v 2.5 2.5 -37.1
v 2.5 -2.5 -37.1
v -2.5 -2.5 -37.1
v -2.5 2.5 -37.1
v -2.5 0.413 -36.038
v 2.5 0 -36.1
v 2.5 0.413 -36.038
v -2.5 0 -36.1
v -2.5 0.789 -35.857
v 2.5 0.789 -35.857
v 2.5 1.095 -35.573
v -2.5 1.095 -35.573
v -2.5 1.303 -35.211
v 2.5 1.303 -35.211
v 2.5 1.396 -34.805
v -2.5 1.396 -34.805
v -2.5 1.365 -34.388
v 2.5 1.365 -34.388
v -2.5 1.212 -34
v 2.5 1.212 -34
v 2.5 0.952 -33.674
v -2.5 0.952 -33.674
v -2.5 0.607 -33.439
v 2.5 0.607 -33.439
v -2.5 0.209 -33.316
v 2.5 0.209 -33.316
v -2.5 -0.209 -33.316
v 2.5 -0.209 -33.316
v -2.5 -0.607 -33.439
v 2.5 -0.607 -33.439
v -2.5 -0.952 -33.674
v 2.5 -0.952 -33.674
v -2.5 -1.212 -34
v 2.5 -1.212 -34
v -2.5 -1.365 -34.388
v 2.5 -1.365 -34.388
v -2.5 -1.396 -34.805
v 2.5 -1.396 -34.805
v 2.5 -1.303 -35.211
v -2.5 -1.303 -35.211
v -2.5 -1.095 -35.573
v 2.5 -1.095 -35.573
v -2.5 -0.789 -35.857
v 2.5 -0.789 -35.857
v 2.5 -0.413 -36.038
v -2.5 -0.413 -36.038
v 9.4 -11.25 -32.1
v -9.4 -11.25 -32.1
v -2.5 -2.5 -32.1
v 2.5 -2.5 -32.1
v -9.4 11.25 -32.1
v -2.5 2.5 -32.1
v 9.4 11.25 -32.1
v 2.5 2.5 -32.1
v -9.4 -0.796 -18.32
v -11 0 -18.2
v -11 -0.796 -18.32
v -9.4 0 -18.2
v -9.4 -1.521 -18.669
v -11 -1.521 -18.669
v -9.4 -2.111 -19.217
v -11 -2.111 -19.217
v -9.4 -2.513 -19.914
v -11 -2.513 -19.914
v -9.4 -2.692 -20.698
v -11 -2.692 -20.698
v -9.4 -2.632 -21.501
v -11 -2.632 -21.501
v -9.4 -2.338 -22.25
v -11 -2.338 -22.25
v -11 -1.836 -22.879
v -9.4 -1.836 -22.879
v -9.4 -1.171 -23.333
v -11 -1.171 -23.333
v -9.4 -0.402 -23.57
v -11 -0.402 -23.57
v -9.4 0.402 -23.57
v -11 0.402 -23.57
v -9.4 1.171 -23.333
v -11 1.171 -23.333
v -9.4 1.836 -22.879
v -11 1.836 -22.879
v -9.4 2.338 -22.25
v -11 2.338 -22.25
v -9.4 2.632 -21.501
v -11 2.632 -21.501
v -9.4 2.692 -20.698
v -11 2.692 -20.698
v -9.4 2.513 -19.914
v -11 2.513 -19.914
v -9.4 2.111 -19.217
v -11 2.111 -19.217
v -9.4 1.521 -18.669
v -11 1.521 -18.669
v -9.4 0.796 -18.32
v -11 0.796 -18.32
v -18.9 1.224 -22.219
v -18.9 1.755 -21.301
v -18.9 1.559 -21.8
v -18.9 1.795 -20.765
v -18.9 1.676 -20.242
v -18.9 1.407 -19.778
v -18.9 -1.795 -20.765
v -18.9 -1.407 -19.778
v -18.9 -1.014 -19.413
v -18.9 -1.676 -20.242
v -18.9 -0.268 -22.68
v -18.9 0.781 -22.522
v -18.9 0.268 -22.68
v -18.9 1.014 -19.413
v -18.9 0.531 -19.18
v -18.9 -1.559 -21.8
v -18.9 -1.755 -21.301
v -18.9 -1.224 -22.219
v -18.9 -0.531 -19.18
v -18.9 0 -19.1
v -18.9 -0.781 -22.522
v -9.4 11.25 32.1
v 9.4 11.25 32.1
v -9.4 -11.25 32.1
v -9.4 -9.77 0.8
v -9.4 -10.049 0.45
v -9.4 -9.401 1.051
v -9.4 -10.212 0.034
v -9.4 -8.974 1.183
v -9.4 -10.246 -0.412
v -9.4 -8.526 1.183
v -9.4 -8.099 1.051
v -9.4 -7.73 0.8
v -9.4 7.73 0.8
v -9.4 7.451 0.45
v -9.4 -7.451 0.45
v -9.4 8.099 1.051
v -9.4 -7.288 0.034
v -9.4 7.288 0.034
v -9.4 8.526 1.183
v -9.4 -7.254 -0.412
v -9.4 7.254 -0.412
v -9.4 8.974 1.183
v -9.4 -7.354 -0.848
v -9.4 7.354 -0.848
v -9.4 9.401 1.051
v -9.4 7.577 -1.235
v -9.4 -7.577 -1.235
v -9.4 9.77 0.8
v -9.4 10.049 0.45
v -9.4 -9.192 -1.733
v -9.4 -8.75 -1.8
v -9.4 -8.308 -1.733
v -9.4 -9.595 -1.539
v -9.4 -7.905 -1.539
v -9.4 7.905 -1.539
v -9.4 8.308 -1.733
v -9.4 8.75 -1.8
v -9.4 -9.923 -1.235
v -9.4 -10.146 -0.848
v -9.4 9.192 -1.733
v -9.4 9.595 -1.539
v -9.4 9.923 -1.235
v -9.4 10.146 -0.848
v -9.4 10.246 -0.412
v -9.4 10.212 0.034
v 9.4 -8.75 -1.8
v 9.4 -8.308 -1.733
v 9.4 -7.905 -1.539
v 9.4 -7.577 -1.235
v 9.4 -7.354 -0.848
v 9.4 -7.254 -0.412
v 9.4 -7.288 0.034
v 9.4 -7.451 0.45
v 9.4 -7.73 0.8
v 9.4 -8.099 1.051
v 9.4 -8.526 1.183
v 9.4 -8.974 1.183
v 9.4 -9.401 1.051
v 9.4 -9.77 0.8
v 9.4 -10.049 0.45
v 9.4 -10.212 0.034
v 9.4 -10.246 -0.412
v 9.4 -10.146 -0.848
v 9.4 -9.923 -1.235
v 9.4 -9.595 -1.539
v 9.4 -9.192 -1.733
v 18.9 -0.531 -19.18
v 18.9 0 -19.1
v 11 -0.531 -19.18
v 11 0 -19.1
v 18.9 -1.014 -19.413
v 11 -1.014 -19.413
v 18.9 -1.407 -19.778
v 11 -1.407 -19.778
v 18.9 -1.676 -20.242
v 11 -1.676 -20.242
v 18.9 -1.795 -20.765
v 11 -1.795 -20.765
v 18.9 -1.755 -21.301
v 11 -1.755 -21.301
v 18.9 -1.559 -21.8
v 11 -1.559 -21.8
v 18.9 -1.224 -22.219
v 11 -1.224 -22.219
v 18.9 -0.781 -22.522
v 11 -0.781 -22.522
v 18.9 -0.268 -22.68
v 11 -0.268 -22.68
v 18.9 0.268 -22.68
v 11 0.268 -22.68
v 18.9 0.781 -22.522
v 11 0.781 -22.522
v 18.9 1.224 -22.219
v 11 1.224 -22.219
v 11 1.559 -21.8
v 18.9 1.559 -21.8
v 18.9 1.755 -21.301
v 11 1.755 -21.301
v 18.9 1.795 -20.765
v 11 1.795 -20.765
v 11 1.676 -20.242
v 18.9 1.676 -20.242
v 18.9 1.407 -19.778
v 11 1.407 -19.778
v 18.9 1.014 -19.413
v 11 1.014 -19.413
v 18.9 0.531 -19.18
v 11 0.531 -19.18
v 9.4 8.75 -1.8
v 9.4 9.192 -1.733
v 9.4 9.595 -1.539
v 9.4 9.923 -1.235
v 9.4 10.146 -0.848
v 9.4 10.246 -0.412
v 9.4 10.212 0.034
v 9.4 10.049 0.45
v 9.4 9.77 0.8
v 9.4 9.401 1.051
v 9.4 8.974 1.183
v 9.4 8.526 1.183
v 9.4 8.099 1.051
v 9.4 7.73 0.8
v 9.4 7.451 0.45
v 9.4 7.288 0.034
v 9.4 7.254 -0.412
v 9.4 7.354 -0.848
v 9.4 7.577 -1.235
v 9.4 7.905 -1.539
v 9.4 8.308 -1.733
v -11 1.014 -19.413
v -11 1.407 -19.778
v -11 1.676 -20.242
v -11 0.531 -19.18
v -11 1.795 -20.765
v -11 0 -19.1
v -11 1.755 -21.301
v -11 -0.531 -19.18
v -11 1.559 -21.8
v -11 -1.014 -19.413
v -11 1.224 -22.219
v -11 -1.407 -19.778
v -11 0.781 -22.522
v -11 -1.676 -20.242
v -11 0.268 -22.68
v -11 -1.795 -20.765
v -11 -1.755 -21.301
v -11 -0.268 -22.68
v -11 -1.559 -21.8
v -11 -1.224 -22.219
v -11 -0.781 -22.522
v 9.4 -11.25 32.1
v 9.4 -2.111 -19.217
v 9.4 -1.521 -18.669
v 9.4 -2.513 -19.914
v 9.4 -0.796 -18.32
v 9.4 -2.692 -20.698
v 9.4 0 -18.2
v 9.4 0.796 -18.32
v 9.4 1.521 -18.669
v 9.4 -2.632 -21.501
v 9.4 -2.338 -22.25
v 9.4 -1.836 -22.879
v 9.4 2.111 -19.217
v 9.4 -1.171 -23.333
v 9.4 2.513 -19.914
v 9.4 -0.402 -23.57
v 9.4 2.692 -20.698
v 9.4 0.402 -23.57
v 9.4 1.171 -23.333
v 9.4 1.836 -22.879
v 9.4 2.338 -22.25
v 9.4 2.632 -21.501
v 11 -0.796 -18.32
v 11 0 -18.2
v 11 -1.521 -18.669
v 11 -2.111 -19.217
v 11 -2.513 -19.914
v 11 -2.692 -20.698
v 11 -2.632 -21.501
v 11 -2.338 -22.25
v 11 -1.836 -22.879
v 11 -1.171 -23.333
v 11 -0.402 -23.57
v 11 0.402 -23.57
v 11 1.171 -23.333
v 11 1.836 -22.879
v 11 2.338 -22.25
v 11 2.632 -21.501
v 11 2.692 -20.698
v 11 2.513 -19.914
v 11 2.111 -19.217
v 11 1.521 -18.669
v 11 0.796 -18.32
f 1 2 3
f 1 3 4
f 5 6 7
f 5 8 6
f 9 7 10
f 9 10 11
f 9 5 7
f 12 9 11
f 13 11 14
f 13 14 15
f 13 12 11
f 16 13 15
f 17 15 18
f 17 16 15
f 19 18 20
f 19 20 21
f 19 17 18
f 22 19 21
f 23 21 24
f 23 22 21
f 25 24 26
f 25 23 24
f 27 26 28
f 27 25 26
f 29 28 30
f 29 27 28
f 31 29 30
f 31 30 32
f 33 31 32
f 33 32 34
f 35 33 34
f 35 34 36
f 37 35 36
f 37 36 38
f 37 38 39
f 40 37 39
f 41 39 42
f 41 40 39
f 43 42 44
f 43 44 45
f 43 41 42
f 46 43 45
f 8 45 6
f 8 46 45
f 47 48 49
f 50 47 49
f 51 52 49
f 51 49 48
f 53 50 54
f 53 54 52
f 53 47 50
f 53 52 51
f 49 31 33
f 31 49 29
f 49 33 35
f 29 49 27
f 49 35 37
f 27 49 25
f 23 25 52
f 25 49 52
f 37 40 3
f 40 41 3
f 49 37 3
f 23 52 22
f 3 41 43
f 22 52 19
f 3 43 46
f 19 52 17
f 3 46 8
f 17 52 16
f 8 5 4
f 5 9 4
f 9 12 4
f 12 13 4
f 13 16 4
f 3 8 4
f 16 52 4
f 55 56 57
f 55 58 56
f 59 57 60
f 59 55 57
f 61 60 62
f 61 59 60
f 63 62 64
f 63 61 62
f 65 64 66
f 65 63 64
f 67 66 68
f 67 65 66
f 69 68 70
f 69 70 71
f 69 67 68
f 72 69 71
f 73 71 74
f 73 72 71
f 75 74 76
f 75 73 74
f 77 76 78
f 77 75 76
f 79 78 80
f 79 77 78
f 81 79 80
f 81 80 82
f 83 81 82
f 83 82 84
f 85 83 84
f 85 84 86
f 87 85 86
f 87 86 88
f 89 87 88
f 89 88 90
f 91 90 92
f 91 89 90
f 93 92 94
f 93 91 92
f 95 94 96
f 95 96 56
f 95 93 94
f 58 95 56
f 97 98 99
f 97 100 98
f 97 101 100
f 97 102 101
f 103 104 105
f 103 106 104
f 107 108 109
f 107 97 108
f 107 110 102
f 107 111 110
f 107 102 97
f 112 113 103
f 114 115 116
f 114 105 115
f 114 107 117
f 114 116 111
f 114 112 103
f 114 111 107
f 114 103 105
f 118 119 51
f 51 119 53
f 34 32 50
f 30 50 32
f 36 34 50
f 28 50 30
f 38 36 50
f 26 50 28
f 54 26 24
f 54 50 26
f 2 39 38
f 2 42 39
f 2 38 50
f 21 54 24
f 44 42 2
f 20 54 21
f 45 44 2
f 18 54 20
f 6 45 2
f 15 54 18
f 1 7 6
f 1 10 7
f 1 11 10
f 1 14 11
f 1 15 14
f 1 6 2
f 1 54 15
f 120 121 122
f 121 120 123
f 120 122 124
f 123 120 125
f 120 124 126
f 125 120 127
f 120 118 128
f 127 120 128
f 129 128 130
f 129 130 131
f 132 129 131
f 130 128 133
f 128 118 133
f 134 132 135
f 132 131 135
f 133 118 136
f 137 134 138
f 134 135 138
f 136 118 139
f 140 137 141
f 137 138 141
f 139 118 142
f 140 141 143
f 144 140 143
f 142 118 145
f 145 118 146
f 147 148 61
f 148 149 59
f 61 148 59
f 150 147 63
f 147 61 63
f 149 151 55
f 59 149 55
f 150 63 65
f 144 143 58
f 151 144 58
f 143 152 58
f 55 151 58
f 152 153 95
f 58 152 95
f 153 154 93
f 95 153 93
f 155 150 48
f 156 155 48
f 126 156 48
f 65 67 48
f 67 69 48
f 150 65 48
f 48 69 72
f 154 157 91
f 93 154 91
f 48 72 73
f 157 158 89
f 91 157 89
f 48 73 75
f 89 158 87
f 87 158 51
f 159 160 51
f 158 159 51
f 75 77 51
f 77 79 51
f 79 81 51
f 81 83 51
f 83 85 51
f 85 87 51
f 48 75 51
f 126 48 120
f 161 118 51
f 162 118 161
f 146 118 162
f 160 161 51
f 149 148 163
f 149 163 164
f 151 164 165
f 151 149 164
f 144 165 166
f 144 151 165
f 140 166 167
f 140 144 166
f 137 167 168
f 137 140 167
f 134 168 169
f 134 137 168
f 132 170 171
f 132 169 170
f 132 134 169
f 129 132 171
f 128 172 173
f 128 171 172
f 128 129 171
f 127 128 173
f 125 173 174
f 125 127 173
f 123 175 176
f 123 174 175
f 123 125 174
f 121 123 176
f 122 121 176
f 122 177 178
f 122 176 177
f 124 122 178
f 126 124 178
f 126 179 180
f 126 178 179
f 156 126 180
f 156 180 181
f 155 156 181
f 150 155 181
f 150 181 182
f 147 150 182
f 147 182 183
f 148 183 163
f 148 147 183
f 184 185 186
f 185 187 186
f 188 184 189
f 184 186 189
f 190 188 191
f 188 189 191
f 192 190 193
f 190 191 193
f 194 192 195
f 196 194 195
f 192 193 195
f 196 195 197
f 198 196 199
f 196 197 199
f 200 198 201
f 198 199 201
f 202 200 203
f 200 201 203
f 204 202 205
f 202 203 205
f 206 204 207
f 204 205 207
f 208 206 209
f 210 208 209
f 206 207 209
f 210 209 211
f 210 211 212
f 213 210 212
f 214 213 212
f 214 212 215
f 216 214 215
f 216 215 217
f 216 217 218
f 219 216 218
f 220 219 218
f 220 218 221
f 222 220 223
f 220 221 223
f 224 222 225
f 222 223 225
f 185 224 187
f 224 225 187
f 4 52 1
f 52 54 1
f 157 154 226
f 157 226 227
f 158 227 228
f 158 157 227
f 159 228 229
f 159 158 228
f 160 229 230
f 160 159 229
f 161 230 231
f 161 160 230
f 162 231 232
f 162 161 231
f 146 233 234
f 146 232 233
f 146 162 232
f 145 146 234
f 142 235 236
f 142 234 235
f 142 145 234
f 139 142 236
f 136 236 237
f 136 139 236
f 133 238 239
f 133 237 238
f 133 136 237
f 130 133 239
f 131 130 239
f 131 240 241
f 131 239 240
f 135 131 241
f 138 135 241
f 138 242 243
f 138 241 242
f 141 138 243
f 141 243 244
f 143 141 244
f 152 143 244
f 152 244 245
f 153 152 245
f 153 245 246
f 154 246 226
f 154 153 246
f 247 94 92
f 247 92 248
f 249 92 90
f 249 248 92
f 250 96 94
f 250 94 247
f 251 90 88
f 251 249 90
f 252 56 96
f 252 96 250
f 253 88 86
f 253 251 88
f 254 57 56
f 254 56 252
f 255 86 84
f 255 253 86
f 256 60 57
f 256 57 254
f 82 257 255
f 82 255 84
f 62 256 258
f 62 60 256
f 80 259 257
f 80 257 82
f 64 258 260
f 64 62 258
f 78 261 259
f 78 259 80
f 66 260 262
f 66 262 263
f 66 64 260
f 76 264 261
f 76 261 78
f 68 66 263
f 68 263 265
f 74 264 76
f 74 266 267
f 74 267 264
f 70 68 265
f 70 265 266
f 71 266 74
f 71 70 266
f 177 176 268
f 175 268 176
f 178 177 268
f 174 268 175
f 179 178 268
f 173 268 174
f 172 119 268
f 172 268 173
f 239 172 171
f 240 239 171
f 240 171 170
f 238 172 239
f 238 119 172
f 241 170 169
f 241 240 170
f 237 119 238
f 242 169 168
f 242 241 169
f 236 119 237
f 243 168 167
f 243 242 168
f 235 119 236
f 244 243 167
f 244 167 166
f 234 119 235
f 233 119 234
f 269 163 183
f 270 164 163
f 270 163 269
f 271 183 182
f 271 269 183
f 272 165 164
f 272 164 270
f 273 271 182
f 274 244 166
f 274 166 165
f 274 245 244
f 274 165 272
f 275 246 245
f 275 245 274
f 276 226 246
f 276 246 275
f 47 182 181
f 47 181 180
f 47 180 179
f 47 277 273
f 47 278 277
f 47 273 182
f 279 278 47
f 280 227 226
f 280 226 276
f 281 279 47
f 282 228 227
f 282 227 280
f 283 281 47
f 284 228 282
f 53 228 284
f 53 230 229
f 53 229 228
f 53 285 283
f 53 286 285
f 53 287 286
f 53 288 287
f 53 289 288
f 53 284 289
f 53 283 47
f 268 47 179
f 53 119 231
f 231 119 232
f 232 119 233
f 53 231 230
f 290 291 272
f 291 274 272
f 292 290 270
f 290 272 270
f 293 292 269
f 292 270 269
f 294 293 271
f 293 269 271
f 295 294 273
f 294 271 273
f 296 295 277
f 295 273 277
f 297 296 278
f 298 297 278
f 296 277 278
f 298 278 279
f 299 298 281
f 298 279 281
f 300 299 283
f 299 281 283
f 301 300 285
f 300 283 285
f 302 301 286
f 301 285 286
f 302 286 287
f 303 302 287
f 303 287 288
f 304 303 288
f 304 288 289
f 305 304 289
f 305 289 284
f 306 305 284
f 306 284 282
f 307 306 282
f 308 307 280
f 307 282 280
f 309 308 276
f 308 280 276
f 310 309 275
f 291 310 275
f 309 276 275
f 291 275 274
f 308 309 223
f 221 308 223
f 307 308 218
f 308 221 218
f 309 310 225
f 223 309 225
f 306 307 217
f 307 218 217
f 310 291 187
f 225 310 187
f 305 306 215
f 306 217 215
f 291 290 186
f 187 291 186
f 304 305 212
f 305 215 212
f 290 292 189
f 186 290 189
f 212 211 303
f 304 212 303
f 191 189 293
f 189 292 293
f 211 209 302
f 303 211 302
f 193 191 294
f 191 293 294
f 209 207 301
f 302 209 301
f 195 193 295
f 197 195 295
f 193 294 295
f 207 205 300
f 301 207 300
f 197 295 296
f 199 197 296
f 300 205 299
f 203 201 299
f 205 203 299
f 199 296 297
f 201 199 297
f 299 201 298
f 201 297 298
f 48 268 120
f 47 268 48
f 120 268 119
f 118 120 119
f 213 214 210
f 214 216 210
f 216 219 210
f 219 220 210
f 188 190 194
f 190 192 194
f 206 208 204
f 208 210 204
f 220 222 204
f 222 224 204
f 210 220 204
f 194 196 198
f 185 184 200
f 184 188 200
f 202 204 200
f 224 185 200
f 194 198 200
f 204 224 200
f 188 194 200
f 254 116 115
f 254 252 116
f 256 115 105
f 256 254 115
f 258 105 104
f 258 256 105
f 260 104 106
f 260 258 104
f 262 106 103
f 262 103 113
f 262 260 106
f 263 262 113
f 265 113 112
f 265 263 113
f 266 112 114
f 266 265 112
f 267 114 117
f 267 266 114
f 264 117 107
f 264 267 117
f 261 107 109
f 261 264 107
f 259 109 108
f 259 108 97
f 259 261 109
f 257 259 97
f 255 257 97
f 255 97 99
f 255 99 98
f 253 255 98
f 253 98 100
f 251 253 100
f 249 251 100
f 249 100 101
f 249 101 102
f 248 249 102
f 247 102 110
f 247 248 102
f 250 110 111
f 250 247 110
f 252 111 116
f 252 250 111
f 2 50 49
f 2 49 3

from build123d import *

# Parameters (mm, degrees)
SKETCH1_W               = 64.2
SKETCH1_H               = 22.5
BOSS_EXTRUDE1_DEPTH     = 9.4
SKETCH3_W               = 5
SKETCH3_H               = 5
SKETCH3_R               = 1.4
BOSS_EXTRUDE2_DEPTH     = 2.5
CUT_EXTRUDE1_DEPTH      = 44.129833063
CUT_EXTRUDE1_DEPTH_BACK = 44.129833063
SKETCH4_R               = 1.5


with BuildPart() as part:
    # Sketch1 → Boss-Extrude1 (new, symmetric)
    with BuildSketch(Plane(origin=(0, 0, 0), x_dir=(0, 0, -1), z_dir=(1, 0, 0))):
        Rectangle(SKETCH1_W, SKETCH1_H)
    extrude(amount=BOSS_EXTRUDE1_DEPTH, both=True)

    # Sketch2 → Revolve1 (revolve)
    with BuildSketch(Plane(origin=(0, 0, 0), x_dir=(1, 0, 0), z_dir=(0, 1, 0)), mode=Mode.PRIVATE) as revolve1_sk:
        Polygon((18.9, 20.9), (18.9, 22.7), (11, 22.7), (11, 23.6), (9.4, 23.6), (9.4, 20.9), align=None)
        Polygon((-9.4, 23.6), (-9.4, 20.9), (-18.9, 20.9), (-18.9, 22.7), (-11, 22.7), (-11, 23.6), align=None)
    revolve(revolve1_sk.sketch.rotate(Axis((0, 0, -20.9), (1, 0, 0)), 180), axis=Axis((0, 0, -20.9), (1, 0, 0)))

    # Sketch3 → Boss-Extrude2 (add, symmetric)
    with BuildSketch(Plane(origin=(0, 0, 0), x_dir=(0, 0, -1), z_dir=(1, 0, 0))):
        with Locations((34.6, 0)):
            Rectangle(SKETCH3_W, SKETCH3_H)
        with Locations((34.7, 0)):
            Circle(SKETCH3_R, mode=Mode.SUBTRACT)
    extrude(amount=BOSS_EXTRUDE2_DEPTH, both=True)

    # Sketch4 → Cut-Extrude1 (cut, two sides: drawn at the far end of the back side and taken through both)
    with BuildSketch(Plane(origin=(0, 0, 0), x_dir=(0, 0, -1), z_dir=(1, 0, 0)).offset(-CUT_EXTRUDE1_DEPTH_BACK)):
        with Locations((0.3, 8.75)):
            Circle(SKETCH4_R)
        with Locations((0.3, -8.75)):
            Circle(SKETCH4_R)
    extrude(amount=CUT_EXTRUDE1_DEPTH + CUT_EXTRUDE1_DEPTH_BACK, mode=Mode.SUBTRACT)


solid = part.part
